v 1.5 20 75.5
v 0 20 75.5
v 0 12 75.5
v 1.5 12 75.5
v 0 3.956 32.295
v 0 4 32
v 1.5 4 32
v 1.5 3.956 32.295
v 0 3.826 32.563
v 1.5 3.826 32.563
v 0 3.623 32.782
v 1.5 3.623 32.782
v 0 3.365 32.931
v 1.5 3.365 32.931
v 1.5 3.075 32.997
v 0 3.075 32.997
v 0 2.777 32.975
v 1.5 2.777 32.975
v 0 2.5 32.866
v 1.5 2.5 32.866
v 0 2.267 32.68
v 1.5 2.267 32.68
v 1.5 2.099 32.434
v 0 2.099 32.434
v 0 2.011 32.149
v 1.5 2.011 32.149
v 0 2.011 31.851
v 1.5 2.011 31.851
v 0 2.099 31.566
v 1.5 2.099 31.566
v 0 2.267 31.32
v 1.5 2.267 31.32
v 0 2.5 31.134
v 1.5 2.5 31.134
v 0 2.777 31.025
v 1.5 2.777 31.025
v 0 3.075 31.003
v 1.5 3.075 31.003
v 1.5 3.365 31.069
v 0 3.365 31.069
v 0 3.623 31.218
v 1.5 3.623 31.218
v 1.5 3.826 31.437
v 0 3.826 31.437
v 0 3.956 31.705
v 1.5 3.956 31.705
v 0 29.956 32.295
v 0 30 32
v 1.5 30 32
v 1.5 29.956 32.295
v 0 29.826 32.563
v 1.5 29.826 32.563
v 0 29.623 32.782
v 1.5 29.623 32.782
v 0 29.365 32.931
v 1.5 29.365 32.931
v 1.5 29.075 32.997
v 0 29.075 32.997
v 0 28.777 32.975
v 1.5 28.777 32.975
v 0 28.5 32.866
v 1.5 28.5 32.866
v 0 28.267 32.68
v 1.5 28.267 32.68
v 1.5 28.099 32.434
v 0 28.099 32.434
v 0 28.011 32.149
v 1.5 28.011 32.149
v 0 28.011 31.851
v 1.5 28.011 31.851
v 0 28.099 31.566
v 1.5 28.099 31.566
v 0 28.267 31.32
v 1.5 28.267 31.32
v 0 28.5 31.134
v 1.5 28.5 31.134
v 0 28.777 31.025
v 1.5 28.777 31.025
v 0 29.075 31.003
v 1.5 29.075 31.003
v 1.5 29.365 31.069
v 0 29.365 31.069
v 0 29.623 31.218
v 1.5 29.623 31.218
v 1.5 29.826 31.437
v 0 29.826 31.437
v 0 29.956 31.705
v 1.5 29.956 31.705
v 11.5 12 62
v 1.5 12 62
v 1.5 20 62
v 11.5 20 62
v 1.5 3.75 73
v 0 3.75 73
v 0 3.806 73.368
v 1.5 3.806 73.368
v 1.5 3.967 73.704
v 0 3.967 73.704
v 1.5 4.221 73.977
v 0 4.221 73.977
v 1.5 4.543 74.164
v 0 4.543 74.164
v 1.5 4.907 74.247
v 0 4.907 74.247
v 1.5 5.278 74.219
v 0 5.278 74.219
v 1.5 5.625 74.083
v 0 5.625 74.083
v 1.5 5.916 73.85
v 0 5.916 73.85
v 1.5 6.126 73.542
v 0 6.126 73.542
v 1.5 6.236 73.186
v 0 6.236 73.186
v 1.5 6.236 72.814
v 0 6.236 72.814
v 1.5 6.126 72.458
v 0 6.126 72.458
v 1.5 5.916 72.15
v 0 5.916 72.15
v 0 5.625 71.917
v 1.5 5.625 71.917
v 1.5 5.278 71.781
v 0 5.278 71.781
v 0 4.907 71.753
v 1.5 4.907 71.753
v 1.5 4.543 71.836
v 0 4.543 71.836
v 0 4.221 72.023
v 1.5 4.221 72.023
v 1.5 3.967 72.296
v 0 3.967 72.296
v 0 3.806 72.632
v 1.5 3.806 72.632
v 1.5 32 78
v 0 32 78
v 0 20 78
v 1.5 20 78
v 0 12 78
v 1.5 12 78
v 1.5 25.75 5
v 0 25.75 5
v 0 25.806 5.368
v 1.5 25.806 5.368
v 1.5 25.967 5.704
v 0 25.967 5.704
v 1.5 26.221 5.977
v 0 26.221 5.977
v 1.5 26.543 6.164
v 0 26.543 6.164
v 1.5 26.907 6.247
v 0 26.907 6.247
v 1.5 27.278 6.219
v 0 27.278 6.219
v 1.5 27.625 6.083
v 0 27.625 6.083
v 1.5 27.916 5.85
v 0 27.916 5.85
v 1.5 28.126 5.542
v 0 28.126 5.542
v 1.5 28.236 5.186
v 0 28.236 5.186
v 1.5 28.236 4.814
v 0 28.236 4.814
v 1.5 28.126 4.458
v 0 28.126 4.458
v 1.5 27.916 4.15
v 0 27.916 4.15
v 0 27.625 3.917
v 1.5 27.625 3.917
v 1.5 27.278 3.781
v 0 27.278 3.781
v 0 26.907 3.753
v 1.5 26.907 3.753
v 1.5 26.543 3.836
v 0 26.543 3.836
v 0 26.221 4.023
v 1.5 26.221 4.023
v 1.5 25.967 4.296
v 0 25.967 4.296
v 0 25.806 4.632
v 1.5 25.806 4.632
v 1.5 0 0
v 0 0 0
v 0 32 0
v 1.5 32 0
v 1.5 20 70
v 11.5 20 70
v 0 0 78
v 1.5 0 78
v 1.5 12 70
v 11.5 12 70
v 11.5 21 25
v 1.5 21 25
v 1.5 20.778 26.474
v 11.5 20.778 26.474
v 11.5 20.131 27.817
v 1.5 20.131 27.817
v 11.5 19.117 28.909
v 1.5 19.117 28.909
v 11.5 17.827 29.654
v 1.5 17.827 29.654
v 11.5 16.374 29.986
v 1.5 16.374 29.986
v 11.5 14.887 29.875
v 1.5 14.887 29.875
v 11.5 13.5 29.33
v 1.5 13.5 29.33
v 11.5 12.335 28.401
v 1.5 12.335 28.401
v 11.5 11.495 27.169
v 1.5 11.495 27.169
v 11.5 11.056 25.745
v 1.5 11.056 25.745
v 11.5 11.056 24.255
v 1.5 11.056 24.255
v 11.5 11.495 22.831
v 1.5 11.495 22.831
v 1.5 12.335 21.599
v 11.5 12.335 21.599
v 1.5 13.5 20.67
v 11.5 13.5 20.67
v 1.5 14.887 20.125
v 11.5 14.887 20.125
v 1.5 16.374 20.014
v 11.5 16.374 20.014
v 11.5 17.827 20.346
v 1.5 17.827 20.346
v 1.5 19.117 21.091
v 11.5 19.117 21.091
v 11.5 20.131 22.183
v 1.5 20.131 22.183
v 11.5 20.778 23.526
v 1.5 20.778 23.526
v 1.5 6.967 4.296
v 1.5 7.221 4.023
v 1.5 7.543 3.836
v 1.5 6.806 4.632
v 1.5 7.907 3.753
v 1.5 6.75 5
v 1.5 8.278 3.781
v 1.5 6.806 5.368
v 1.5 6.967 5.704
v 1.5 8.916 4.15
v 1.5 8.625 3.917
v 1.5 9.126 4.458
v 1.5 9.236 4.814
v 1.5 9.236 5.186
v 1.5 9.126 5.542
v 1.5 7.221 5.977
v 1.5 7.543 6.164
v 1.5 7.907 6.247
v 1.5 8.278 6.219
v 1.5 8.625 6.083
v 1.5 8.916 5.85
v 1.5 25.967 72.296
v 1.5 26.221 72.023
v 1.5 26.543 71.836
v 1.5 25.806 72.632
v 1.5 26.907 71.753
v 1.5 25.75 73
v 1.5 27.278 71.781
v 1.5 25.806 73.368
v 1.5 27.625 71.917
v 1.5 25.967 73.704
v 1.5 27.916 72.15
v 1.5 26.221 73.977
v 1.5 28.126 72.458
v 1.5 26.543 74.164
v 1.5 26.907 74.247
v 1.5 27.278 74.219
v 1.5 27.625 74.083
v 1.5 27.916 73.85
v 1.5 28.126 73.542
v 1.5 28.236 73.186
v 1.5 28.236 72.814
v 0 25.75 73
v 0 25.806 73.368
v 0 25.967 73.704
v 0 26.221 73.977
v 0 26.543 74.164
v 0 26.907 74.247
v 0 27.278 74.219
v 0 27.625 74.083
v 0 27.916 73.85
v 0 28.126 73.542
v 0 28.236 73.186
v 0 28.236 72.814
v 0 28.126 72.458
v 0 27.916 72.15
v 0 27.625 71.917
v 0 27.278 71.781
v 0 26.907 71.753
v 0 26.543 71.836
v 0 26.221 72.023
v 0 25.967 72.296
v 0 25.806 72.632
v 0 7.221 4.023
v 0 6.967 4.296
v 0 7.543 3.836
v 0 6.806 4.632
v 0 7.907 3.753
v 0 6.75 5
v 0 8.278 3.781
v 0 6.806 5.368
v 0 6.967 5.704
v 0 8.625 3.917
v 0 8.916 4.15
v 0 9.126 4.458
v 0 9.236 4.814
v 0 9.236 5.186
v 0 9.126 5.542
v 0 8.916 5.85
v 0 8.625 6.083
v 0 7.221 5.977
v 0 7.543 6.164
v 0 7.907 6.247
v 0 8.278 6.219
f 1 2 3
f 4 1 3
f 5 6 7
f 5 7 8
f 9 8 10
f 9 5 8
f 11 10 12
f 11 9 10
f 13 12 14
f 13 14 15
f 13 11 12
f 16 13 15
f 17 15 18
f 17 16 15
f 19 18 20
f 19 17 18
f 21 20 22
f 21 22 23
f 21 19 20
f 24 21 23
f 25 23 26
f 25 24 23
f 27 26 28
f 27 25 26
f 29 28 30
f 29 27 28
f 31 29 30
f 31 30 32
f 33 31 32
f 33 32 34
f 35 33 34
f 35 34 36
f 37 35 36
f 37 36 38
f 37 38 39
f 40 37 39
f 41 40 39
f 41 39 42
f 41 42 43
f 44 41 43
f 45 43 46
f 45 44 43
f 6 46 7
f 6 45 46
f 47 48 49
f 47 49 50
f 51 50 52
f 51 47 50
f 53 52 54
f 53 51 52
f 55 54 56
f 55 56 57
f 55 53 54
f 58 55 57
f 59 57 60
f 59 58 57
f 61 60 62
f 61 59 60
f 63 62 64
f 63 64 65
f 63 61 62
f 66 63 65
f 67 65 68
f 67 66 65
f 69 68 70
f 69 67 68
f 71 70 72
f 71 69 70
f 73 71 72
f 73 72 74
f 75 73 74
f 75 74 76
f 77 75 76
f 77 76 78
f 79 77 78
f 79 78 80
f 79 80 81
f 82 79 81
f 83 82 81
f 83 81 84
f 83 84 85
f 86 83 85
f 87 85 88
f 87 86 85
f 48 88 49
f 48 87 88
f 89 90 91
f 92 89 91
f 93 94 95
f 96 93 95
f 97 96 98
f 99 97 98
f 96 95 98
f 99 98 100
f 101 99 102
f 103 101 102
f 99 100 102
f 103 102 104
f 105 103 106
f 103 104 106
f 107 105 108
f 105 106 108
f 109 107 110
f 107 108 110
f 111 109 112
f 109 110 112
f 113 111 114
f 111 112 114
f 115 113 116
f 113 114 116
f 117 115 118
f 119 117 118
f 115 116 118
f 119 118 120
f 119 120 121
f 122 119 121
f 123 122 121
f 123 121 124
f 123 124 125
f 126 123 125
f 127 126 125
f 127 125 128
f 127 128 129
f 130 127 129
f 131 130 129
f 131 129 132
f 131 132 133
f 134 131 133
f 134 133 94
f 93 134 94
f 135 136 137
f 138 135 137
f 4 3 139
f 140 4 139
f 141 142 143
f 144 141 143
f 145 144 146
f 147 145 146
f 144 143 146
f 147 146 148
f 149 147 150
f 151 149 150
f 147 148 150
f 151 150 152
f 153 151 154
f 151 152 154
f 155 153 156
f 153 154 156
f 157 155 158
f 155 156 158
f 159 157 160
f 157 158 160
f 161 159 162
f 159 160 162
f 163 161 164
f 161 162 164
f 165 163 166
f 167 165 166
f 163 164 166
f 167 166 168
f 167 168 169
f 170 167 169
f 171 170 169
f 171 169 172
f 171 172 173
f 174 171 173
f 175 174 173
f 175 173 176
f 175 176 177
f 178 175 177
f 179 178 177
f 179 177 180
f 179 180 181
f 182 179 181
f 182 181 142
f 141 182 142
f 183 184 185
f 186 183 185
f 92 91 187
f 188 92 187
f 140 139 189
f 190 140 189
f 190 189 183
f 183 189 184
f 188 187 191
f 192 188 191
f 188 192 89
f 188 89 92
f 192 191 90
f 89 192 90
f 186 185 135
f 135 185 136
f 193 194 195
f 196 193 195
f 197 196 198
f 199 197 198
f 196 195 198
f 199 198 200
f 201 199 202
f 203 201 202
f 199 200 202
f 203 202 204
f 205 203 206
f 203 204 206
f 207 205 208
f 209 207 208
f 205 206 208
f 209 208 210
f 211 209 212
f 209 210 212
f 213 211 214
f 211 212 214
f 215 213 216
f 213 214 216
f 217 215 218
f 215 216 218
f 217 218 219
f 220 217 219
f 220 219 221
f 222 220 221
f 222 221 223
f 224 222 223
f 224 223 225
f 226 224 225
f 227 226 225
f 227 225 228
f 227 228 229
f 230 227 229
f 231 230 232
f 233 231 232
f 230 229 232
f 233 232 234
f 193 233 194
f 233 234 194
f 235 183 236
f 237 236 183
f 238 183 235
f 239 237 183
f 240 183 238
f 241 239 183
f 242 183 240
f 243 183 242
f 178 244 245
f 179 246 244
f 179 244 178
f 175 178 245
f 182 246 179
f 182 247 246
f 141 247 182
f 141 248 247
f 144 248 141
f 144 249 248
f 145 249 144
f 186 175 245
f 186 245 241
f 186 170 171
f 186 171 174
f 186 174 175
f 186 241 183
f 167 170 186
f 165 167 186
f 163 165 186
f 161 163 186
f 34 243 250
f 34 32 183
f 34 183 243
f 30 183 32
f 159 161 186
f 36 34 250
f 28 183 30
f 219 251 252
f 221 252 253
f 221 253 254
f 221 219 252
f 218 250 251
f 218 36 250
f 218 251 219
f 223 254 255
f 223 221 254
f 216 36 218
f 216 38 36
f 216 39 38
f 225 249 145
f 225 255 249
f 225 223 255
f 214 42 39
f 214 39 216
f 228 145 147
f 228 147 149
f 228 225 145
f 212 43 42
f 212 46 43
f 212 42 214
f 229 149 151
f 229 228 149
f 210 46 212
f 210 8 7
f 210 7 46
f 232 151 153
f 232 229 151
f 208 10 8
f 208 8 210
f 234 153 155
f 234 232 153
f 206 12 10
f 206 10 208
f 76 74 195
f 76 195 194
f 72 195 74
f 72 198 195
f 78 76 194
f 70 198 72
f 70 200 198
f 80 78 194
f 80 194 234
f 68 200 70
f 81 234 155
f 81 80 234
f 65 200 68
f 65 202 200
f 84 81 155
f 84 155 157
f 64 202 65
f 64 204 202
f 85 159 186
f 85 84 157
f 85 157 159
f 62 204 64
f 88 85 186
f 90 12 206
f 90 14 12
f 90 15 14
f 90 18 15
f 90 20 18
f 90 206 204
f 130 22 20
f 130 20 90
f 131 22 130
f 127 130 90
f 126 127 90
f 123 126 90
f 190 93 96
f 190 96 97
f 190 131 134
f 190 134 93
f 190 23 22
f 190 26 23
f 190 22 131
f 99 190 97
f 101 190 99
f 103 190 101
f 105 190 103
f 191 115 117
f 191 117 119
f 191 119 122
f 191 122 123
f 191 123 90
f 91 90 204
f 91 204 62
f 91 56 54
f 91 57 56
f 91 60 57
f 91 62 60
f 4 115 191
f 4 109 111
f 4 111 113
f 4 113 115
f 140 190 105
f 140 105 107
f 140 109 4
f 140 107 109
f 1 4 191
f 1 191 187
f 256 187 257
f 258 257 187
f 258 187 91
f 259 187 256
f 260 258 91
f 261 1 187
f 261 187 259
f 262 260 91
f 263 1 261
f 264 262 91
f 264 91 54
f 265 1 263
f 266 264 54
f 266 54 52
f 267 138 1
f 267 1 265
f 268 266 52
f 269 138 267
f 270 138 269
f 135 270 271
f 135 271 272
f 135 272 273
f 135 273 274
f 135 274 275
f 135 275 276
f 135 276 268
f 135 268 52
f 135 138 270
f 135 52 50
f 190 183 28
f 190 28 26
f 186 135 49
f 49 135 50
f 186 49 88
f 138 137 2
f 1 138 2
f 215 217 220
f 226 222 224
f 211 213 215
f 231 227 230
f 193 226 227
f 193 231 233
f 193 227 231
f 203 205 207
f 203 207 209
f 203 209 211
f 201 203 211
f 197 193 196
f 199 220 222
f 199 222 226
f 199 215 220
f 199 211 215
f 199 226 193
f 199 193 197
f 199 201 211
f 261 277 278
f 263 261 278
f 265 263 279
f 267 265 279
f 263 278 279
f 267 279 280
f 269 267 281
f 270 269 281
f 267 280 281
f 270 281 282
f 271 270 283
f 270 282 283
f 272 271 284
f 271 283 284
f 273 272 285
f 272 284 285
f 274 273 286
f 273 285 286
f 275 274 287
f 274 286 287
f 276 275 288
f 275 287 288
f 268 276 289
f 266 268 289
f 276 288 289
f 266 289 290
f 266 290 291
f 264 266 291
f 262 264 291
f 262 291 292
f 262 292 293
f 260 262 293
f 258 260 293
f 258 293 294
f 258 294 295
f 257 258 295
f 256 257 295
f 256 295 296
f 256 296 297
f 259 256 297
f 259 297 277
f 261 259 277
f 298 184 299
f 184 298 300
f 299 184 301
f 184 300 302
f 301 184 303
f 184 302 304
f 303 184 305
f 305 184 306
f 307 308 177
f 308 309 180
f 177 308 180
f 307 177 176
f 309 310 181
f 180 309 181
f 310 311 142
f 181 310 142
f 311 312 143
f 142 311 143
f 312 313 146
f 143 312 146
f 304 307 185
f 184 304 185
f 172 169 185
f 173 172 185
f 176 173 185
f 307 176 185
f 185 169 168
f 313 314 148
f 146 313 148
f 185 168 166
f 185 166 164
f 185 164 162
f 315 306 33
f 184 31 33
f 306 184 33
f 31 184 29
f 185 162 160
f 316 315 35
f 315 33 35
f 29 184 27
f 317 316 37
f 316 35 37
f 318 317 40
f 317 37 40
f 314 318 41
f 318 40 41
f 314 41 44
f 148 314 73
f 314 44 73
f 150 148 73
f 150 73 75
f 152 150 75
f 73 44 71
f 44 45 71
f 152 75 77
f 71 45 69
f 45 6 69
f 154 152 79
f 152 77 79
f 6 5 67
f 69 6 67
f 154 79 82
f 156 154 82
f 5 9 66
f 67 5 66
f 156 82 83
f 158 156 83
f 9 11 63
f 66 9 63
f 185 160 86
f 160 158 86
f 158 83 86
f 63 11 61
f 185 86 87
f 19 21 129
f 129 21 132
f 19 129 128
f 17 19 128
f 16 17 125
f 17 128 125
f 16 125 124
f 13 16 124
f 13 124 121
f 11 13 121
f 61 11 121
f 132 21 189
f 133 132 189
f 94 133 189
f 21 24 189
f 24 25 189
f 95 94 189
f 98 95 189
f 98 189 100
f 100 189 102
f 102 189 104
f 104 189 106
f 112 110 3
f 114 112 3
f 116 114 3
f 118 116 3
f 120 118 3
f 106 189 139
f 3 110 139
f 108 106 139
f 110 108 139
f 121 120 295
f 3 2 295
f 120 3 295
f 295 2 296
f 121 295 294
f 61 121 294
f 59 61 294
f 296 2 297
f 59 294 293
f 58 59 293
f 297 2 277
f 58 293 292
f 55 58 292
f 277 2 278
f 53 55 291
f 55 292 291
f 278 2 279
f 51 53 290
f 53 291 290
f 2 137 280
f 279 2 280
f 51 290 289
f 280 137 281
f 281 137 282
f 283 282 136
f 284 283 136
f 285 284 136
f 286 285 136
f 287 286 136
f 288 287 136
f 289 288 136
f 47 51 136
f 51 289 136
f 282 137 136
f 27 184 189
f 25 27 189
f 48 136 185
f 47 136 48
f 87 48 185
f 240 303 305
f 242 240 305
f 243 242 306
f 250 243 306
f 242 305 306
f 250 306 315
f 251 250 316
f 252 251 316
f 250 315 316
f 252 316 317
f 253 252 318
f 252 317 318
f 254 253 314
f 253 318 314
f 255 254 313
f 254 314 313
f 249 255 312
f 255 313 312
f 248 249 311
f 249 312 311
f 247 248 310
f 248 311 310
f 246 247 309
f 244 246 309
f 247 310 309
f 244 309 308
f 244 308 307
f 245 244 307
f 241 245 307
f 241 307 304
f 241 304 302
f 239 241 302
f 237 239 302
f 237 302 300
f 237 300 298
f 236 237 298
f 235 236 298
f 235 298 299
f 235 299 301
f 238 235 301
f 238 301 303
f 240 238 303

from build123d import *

# Parameters (mm, degrees)
F0_R     = 1
F1_DEPTH = 1.5
F2_R     = 5
F3_DEPTH = 10
F5_DEPTH = 10
F7_D     = 2.5


with BuildPart() as f1:
    # F0 (on Right) → F1 (new body)
    with BuildSketch(Plane.YZ):
        Polygon((0, 78), (0, 0), (32, 0), (32, 78), (20, 78), (20, 75.5), (12, 75.5), (12, 78), align=None)
        with Locations((3, 32)):
            Circle(F0_R, mode=Mode.SUBTRACT)
        with Locations((29, 32)):
            Circle(F0_R, mode=Mode.SUBTRACT)
    extrude(amount=F1_DEPTH)

    # F2 (on face) → F3 (join)
    with BuildSketch(Plane.YZ.offset(1.5)):
        with Locations((16, 25)):
            Circle(F2_R)
    extrude(amount=F3_DEPTH)

    # F4 (on face) → F5 (join)
    with BuildSketch(Plane.YZ.offset(1.5)):
        Polygon((20, 70), (16, 70), (12, 70), (12, 62), (20, 62), align=None)
    extrude(amount=F5_DEPTH)

    # F7 (through all)
    with Locations(Plane.YZ.offset(1.5)):
        with Locations((5, 73), (27, 73), (27, 5), (8, 5)):
            Hole(F7_D / 2)


solid = f1.part
